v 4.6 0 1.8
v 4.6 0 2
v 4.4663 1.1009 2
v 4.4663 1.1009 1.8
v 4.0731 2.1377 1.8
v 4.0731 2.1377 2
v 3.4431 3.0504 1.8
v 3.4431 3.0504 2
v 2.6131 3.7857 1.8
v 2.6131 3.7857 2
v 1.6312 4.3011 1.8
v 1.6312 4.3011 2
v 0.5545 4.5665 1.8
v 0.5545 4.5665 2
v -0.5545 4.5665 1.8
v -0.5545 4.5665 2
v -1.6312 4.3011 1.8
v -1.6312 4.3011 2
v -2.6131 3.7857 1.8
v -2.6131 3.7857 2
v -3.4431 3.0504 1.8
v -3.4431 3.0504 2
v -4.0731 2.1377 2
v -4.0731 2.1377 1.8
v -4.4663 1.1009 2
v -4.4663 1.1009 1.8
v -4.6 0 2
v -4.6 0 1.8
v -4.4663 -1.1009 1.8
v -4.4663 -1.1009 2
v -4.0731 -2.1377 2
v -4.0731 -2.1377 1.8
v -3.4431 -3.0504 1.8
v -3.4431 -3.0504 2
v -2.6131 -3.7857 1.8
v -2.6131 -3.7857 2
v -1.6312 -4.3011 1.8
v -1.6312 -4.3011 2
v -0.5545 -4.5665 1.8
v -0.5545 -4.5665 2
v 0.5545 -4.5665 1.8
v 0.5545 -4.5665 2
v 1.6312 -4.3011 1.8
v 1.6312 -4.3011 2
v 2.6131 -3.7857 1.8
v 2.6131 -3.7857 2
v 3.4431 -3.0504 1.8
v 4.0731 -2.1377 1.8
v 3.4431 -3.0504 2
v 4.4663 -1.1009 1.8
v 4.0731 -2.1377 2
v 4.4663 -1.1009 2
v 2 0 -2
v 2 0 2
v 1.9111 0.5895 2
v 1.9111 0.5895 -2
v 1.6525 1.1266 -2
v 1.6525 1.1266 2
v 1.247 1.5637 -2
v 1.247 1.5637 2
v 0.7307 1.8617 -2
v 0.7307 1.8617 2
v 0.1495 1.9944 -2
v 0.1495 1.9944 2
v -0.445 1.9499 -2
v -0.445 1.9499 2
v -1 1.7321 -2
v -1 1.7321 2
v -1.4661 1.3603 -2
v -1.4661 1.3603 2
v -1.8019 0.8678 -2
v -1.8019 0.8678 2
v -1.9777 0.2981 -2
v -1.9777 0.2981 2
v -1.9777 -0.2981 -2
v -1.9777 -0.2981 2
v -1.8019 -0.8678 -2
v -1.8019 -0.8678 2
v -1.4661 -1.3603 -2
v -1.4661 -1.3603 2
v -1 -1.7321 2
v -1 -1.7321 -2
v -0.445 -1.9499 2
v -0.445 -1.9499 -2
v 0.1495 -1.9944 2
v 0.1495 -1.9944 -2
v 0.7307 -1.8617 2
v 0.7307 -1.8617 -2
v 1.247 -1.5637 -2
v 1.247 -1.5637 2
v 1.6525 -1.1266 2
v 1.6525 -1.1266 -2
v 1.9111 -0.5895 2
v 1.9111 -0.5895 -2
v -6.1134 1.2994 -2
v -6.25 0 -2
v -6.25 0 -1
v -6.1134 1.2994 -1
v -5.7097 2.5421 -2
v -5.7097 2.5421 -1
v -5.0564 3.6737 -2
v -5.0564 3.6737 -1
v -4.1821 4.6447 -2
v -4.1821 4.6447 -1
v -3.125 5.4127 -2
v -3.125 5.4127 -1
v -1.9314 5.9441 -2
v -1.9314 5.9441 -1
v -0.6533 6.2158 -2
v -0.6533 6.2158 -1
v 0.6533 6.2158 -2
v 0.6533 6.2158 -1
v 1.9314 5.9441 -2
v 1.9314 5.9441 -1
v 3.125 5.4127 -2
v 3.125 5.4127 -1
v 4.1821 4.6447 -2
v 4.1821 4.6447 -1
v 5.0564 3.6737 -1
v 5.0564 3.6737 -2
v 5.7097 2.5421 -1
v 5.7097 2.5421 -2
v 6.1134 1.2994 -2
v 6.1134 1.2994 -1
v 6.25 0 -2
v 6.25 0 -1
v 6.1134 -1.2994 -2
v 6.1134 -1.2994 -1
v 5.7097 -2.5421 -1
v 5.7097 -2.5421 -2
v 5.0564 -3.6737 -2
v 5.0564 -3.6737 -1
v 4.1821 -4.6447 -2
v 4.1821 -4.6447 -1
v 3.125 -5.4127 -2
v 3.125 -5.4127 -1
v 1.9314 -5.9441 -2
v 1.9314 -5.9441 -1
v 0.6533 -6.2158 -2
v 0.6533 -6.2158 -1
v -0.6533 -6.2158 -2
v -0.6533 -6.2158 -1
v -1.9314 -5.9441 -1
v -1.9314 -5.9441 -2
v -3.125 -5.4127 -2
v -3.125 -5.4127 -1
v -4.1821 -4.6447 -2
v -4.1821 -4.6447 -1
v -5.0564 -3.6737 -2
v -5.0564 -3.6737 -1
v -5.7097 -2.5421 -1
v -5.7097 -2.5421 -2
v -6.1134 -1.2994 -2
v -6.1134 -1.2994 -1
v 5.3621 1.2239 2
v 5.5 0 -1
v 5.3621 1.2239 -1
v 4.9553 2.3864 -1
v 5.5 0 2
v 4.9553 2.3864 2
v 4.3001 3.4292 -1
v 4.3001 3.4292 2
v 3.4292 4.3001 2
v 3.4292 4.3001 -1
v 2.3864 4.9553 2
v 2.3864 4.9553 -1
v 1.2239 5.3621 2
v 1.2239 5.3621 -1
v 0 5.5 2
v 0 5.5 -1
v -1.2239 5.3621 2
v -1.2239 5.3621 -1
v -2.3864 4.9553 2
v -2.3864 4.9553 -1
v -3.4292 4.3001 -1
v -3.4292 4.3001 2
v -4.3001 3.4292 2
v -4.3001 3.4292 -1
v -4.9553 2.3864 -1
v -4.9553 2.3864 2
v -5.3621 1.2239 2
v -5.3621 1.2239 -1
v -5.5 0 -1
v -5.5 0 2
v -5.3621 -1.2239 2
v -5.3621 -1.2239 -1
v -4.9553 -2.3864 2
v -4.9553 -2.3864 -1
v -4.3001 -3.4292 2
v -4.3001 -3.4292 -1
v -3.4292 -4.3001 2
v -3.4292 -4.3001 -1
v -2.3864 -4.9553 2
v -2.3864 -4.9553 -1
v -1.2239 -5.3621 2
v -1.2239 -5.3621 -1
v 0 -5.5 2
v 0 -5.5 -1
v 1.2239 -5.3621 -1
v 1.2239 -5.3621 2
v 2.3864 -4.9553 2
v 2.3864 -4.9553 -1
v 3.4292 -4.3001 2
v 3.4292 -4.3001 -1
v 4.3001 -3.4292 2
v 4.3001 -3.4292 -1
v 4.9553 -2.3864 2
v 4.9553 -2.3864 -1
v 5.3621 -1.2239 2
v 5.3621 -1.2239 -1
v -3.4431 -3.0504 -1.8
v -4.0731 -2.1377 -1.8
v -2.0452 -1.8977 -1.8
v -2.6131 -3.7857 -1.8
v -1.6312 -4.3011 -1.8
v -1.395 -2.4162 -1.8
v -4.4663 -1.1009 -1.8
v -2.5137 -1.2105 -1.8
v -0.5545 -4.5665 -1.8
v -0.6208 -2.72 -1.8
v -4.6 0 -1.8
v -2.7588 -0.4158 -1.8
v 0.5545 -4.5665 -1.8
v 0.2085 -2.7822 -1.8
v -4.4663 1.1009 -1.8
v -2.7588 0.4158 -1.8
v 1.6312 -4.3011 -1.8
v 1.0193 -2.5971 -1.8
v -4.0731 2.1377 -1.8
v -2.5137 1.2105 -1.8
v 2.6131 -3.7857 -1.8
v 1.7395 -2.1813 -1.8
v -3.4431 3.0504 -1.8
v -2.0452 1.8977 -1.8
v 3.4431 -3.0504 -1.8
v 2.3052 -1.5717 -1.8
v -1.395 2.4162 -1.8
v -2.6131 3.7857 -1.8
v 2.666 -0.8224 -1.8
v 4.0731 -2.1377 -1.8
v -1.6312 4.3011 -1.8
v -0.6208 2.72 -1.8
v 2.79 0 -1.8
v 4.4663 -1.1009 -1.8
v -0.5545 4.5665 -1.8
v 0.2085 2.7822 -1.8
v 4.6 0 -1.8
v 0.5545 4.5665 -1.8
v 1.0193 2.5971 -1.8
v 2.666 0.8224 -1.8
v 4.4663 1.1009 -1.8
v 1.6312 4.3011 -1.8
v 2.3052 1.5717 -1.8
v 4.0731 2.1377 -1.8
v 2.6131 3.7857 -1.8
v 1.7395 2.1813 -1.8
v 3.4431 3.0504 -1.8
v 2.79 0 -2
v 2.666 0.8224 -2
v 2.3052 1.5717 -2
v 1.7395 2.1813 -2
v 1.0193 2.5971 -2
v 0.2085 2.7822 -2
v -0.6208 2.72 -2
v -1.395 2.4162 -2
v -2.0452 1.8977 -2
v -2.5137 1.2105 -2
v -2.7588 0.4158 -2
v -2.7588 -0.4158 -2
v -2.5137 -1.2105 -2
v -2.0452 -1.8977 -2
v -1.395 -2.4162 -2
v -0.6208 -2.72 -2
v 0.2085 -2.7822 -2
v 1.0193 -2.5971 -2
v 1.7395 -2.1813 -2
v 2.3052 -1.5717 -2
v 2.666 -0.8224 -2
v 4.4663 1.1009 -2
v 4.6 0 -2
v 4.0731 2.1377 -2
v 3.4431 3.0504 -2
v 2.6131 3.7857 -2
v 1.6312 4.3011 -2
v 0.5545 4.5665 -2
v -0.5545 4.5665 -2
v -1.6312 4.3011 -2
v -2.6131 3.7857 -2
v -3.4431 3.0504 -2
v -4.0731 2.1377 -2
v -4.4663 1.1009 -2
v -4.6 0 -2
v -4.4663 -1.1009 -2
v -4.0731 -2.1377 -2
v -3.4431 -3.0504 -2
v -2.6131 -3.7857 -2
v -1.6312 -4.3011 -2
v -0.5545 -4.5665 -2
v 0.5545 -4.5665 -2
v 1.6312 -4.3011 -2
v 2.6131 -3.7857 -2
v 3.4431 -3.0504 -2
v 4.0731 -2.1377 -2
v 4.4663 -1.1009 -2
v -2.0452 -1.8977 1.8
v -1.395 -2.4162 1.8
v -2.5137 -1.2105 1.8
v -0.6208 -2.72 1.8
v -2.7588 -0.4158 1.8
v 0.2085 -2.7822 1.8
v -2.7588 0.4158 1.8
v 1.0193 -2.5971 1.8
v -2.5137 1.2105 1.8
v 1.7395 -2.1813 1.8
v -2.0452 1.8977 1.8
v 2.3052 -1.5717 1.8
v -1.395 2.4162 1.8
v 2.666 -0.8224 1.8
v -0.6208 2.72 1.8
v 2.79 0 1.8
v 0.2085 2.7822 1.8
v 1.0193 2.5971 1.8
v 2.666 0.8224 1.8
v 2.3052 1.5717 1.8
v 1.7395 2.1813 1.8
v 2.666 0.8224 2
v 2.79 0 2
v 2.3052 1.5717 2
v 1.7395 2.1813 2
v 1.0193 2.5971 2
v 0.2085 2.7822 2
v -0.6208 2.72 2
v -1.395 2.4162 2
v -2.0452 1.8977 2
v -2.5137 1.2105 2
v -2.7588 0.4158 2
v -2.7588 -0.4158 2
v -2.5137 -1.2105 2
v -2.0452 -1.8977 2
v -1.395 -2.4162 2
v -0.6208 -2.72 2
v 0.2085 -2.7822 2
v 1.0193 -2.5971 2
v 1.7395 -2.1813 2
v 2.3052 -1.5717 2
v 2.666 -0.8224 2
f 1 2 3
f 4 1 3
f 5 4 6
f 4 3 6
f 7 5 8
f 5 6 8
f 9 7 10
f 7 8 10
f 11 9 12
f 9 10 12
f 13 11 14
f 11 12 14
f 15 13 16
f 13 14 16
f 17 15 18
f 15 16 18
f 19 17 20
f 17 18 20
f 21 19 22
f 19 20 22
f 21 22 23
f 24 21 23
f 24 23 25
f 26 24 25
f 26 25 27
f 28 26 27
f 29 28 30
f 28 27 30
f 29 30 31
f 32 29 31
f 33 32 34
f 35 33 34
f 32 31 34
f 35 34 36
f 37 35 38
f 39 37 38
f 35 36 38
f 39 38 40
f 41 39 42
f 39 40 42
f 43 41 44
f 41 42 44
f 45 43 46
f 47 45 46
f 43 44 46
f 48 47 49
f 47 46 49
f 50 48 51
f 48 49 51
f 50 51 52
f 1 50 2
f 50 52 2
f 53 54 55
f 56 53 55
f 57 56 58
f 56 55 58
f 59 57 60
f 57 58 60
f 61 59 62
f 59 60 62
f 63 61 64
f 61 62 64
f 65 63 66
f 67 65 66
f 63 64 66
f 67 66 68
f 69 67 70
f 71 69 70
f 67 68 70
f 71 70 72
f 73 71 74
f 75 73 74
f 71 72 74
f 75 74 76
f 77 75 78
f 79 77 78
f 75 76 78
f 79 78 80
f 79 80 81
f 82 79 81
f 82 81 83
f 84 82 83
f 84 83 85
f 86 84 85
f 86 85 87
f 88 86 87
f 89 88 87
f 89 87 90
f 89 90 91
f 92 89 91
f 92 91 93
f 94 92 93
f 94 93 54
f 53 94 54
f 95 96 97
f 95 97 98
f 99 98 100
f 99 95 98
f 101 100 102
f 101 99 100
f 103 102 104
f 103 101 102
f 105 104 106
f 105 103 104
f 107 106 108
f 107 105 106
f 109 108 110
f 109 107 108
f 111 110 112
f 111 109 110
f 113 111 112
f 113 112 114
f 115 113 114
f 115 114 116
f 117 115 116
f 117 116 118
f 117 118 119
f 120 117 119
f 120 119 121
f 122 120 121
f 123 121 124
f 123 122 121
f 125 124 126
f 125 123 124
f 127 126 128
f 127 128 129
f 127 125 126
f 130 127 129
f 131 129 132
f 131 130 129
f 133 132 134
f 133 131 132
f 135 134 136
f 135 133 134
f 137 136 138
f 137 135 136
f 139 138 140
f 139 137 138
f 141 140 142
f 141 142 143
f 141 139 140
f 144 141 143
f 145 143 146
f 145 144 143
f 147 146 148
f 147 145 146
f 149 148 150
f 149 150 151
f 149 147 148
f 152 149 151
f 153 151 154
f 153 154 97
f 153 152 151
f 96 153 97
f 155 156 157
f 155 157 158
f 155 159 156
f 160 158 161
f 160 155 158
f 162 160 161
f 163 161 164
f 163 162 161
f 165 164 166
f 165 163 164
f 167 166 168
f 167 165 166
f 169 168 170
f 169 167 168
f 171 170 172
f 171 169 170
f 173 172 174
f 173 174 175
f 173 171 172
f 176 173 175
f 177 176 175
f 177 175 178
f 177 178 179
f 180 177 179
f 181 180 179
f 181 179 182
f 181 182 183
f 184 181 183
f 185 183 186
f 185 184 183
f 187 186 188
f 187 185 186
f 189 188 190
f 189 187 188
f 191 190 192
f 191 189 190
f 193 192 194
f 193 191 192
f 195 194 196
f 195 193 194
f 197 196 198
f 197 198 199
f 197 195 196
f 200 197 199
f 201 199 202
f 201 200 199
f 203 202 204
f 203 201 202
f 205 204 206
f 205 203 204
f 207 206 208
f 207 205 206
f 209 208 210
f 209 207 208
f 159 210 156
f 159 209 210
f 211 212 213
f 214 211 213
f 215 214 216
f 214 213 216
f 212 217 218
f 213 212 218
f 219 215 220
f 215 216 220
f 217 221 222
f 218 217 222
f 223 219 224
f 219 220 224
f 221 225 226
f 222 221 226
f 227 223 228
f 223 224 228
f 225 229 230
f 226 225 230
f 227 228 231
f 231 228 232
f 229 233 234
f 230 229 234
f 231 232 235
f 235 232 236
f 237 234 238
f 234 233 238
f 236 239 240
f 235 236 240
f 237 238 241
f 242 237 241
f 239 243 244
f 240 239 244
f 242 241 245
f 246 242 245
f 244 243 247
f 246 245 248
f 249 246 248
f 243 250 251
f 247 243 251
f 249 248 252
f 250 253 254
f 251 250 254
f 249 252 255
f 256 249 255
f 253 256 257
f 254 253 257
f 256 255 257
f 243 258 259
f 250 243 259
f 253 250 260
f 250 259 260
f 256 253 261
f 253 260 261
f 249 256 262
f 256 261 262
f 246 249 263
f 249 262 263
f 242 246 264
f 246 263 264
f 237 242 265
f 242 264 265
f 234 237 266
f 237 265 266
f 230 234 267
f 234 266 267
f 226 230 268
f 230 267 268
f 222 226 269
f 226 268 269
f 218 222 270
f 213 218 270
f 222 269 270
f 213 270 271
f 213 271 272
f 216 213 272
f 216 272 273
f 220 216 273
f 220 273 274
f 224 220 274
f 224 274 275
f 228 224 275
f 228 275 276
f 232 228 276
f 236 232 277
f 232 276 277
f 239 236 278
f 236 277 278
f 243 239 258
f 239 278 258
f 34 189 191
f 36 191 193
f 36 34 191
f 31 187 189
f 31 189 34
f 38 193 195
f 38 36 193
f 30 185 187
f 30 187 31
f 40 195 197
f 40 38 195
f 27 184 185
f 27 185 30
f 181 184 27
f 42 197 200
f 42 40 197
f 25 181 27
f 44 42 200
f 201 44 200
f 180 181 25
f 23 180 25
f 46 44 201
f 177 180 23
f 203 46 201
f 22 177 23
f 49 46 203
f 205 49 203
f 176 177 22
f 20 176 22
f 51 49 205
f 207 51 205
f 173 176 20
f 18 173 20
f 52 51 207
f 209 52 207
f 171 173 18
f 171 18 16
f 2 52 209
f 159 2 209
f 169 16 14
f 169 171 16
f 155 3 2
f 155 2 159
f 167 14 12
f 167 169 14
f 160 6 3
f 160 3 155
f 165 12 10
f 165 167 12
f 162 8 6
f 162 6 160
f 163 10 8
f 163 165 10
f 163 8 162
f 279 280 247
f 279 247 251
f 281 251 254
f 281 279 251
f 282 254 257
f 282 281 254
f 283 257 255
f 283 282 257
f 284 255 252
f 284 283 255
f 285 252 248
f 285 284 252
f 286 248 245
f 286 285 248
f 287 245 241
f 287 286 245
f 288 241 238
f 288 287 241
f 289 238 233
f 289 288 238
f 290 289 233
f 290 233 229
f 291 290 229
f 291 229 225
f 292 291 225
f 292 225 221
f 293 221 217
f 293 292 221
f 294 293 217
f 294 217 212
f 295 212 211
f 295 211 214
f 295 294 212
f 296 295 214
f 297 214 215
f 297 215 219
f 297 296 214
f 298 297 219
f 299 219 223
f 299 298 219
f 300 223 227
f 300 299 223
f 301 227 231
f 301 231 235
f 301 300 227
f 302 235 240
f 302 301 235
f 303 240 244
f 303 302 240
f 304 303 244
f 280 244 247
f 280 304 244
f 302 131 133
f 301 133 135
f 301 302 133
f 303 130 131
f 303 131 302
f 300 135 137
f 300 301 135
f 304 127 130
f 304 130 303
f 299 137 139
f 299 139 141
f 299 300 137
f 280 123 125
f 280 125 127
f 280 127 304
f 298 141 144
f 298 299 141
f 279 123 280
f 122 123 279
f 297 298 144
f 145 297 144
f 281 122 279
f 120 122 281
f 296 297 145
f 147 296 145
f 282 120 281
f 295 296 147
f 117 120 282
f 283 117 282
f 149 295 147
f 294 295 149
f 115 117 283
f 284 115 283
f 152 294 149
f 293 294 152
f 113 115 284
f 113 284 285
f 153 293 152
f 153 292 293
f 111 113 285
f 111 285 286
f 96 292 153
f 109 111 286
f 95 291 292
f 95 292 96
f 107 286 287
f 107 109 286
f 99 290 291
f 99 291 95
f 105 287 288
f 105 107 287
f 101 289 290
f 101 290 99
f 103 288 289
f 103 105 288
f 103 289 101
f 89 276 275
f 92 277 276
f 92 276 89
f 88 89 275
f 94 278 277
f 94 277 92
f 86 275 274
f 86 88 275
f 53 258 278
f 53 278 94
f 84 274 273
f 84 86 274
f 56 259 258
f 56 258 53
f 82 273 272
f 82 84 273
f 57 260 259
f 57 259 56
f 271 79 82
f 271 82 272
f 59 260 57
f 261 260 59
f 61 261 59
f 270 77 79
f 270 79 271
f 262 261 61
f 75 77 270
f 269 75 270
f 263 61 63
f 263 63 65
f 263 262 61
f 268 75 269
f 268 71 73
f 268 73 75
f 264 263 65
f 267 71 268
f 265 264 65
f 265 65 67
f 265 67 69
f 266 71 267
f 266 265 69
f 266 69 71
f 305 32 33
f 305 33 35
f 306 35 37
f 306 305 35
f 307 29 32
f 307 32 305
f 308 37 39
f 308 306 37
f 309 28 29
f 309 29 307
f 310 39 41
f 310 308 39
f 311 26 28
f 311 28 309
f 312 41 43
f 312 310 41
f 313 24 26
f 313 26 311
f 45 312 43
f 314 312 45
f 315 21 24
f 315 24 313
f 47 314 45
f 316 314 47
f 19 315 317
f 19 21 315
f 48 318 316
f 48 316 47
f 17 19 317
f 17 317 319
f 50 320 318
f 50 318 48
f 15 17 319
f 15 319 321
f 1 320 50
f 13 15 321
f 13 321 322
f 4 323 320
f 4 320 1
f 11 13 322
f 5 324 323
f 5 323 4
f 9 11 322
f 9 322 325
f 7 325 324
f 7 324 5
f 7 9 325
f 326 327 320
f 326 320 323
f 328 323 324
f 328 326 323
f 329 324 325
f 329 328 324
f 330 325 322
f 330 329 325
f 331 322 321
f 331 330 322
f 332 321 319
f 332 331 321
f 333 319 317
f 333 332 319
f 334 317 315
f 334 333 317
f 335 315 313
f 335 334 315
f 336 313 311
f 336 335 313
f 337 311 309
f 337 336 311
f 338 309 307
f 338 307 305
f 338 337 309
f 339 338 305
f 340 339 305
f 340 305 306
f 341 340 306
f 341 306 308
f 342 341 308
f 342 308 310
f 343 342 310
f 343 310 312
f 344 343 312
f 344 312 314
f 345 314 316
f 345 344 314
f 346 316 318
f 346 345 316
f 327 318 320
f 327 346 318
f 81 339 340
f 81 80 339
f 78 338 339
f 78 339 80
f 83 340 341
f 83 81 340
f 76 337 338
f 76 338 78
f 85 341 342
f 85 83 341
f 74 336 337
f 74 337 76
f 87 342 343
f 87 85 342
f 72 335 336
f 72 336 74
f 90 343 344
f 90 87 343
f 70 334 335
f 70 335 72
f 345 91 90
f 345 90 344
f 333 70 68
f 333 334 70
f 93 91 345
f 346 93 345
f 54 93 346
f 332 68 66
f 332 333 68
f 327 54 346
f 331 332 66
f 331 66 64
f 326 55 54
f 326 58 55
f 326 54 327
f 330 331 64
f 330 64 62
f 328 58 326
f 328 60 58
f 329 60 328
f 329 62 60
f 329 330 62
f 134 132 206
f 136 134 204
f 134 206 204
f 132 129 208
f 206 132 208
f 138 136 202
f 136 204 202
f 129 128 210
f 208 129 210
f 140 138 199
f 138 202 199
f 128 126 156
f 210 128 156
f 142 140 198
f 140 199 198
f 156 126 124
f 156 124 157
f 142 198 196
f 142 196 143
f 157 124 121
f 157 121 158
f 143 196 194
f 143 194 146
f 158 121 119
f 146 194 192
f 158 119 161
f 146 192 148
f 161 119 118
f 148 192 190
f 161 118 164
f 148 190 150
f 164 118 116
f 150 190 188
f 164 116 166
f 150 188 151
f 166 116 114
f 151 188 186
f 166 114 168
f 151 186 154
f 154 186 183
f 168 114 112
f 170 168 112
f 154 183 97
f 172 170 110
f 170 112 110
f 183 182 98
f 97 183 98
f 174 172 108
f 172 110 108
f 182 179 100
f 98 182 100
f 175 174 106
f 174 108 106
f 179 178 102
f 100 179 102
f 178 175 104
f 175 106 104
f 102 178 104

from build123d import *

# Parameters (mm, degrees)
SKETCH_1_R          = 5.5
EXTRUDE_1_DEPTH     = 2
SKETCH_4_R          = 6.25
EXTRUDE_2_DEPTH     = 1
SKETCH_2_R          = 2
CUT_EXTRUDE_1_DEPTH = 10.701803956
SKETCH_3_R          = 4.6
SKETCH_3_R_2        = 2.79
CUT_EXTRUDE_2_DEPTH = 0.2


with BuildPart() as part:
    # 草圖1 → 填料-伸長1 (new, symmetric)
    with BuildSketch(Plane.XY):
        Circle(SKETCH_1_R)
    extrude(amount=EXTRUDE_1_DEPTH, both=True)

    # 草圖4 → 填料-伸長2 (add)
    with BuildSketch(Plane(origin=(0, 0, -2), x_dir=(-1, 0, 0), z_dir=(0, 0, -1))):
        Circle(SKETCH_4_R)
    extrude(amount=-EXTRUDE_2_DEPTH)

    # 草圖2 → 除料-伸長1 (cut, through all)
    with BuildSketch(Plane.XY.offset(2)):
        Circle(SKETCH_2_R)
    extrude(amount=-CUT_EXTRUDE_1_DEPTH, mode=Mode.SUBTRACT)

    # 草圖3 → 除料-伸長2 (cut)
    with BuildSketch(Plane.XY.offset(2)):
        Circle(SKETCH_3_R)
        Circle(SKETCH_3_R_2, mode=Mode.SUBTRACT)
    cut_extrude_2 = extrude(amount=-CUT_EXTRUDE_2_DEPTH, mode=Mode.SUBTRACT)

    # 鏡射1: 除料-伸長2 across plane
    add(cut_extrude_2.mirror(Plane.XY), mode=Mode.SUBTRACT)


solid = part.part
